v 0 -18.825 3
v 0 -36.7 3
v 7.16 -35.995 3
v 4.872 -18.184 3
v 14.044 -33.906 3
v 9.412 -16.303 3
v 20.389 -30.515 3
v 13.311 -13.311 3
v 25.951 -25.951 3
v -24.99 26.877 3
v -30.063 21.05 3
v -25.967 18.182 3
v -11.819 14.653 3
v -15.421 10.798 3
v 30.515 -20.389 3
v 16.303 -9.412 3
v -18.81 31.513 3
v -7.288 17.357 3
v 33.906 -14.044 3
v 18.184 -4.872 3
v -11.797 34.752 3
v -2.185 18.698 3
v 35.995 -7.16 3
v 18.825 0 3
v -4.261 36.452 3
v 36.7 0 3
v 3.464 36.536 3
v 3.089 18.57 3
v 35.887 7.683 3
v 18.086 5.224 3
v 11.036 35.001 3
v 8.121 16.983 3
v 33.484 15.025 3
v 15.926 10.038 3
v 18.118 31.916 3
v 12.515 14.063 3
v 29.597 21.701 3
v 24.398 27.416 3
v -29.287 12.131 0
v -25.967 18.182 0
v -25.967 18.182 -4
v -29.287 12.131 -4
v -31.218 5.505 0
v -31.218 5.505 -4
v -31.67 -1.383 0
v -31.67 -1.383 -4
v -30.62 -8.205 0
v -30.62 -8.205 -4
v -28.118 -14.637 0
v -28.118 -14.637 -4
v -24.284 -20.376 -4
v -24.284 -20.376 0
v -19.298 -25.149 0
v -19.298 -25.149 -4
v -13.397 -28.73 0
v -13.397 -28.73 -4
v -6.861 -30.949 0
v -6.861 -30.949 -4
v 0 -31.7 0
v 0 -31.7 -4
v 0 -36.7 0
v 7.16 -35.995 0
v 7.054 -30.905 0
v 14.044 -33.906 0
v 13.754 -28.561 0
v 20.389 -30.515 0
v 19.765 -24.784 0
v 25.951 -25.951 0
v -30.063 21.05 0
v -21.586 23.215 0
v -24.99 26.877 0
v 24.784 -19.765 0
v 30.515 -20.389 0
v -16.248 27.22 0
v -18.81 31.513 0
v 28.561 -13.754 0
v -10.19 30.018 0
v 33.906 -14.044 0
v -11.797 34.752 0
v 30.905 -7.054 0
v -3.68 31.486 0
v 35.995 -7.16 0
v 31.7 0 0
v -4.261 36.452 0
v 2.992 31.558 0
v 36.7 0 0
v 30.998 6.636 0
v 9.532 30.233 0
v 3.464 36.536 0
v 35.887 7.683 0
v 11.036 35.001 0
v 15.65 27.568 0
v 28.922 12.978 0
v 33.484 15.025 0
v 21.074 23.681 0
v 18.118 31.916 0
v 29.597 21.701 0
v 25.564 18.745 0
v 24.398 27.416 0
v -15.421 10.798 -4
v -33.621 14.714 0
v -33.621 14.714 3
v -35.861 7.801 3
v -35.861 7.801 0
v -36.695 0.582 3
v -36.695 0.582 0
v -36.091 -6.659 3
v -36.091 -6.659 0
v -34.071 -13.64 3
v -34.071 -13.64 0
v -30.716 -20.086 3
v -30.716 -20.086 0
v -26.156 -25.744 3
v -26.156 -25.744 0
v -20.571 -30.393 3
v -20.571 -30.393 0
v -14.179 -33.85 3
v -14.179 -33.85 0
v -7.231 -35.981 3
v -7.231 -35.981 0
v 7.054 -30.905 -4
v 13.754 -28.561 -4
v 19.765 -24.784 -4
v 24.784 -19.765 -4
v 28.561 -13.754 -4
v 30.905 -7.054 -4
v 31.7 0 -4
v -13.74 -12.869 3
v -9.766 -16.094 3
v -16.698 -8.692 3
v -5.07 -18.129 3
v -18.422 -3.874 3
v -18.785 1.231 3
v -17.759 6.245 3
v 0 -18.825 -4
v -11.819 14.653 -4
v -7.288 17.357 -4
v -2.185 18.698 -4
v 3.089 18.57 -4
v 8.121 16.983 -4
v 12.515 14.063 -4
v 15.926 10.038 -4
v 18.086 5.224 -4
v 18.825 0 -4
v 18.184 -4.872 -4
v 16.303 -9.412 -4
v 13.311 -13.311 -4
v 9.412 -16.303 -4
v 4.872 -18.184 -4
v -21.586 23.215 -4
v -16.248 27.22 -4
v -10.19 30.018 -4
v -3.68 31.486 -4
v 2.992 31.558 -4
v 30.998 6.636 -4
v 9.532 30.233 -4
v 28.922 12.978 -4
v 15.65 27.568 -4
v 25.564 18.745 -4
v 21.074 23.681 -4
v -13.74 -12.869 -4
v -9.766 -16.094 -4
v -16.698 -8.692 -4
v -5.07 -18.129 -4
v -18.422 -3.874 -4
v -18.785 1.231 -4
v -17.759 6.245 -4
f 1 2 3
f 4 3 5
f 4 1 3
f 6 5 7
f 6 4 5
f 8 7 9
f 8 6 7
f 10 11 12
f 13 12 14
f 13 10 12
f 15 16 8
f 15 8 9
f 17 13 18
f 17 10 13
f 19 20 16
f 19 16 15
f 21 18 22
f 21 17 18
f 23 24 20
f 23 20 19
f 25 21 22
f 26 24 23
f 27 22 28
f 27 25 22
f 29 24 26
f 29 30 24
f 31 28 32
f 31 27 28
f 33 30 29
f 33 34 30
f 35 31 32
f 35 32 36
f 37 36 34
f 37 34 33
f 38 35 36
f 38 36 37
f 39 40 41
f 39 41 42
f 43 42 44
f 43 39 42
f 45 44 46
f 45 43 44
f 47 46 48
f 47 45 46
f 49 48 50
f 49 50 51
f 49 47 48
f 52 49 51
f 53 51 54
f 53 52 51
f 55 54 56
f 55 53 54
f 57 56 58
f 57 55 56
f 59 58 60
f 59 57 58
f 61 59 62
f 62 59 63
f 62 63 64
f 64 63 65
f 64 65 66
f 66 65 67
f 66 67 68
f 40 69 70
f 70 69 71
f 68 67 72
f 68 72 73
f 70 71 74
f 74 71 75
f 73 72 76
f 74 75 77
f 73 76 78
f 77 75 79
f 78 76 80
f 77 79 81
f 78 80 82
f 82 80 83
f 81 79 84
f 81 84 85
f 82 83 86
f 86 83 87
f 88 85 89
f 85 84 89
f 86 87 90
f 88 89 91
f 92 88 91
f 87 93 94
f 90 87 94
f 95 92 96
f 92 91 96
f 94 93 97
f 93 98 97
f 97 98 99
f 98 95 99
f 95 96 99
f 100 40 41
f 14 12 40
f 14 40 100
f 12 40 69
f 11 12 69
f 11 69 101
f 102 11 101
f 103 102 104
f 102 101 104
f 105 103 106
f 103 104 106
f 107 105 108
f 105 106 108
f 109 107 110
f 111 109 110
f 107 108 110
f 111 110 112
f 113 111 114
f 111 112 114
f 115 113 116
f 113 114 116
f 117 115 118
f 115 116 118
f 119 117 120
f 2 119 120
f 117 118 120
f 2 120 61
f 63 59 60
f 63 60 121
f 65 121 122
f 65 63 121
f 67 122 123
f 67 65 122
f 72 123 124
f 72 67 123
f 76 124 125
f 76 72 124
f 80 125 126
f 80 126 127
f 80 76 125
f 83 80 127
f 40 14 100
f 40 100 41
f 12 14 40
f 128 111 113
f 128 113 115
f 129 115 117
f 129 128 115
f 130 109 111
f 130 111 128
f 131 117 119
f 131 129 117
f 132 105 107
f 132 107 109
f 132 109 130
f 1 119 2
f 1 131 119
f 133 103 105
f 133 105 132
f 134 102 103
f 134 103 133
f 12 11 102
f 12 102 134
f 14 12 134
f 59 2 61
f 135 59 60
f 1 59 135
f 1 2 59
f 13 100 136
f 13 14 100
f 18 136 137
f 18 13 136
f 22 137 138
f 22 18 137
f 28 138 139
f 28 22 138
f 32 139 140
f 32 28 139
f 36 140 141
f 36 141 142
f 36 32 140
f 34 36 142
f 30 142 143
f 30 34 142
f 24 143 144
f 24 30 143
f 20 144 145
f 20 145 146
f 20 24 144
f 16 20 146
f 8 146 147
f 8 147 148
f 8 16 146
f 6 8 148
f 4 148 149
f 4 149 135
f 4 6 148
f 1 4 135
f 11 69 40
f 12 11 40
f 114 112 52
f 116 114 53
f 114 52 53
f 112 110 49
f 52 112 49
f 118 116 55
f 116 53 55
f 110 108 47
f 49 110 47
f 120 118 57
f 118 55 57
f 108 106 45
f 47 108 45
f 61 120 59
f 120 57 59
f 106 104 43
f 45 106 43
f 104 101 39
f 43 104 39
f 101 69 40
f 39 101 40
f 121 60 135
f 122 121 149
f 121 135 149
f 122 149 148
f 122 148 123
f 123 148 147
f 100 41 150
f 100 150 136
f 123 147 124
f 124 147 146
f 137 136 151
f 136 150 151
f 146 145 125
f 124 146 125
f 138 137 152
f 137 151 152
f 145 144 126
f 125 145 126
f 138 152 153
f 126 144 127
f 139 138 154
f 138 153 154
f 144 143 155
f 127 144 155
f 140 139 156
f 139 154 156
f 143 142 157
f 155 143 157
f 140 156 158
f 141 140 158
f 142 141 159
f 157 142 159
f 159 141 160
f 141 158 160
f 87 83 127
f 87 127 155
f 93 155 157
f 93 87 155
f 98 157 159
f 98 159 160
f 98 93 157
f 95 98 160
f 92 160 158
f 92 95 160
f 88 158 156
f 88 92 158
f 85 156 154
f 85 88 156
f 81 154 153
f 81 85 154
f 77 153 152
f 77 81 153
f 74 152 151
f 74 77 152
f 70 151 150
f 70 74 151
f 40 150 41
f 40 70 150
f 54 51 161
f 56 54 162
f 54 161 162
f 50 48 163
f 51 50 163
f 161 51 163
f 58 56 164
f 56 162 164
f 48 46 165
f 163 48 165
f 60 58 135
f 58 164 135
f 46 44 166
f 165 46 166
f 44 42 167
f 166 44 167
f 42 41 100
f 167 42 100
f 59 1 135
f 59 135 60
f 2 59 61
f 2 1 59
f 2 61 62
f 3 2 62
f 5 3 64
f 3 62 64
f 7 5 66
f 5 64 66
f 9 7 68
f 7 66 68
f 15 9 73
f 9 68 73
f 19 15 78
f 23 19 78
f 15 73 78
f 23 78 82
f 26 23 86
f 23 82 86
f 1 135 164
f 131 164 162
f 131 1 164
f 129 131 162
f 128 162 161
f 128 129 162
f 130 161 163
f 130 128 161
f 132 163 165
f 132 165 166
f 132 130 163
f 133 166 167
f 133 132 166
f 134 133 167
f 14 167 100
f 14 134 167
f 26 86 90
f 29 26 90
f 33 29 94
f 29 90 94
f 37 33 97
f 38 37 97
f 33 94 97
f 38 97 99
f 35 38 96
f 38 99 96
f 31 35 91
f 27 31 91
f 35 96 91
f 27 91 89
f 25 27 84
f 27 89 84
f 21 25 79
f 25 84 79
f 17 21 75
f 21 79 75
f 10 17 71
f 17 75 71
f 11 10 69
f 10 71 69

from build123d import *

# Parameters (mm, degrees)
F1_DEPTH = 3
F2_DEPTH = 4
F3_DEPTH = 3
F4_DEPTH = 4


with BuildPart() as f1:
    # F0 (on Top) → F1 (new body)
    with BuildSketch(Plane.XY):
        with BuildLine():
            Line((-30.0628800254, 21.0502552141), (-25.967119804, 18.1823730323))
            ThreePointArc((-25.967119804, 18.1823730323), (9.5323738443, 30.2328273387), (31.7, 0))
            ThreePointArc((31.7, 0), (22.4152849636, -22.4152849636), (0, -31.7))
            Line((0, -31.7), (0, -36.7))
            ThreePointArc((0, -36.7), (25.9508188695, -25.9508188695), (36.7, 0))
            ThreePointArc((36.7, 0), (11.0359028418, 35.0014120925), (-30.0628800254, 21.0502552141))
        make_face()
        with BuildLine():
            ThreePointArc((-15.4205372337, 10.7975764143), (5.6607866757, 17.9537215978), (18.825, 0))
            ThreePointArc((18.825, 0), (13.3112851558, -13.3112851558), (0, -18.825))
            Line((0, -18.825), (0, -31.7))
            ThreePointArc((0, -31.7), (22.4152849636, -22.4152849636), (31.7, 0))
            ThreePointArc((31.7, 0), (9.5323738443, 30.2328273387), (-25.967119804, 18.1823730323))
            Line((-25.967119804, 18.1823730323), (-15.4205372337, 10.7975764143))
        make_face()
    extrude(amount=F1_DEPTH)

    # F0 (on Top) → F2 (join)
    with BuildSketch(Plane.XY):
        with BuildLine():
            ThreePointArc((-15.4205372337, 10.7975764143), (5.6607866757, 17.9537215978), (18.825, 0))
            ThreePointArc((18.825, 0), (13.3112851558, -13.3112851558), (0, -18.825))
            Line((0, -18.825), (0, -31.7))
            ThreePointArc((0, -31.7), (22.4152849636, -22.4152849636), (31.7, 0))
            ThreePointArc((31.7, 0), (9.5323738443, 30.2328273387), (-25.967119804, 18.1823730323))
            Line((-25.967119804, 18.1823730323), (-15.4205372337, 10.7975764143))
        make_face()
    extrude(amount=-F2_DEPTH)


with BuildPart() as f3:
    # F0 (on Top) → F3 (new body)
    with BuildSketch(Plane.XY):
        with BuildLine():
            ThreePointArc((0, -18.825), (-16.6979789346, -8.6924176441), (-15.4205372337, 10.7975764143))
            Line((-15.4205372337, 10.7975764143), (-25.967119804, 18.1823730323))
            ThreePointArc((-25.967119804, 18.1823730323), (-28.1182434117, -14.6374310396), (0, -31.7))
            Line((0, -31.7), (0, -18.825))
        make_face()
        with BuildLine():
            ThreePointArc((0, -31.7), (-28.1182434117, -14.6374310396), (-25.967119804, 18.1823730323))
            Line((-25.967119804, 18.1823730323), (-30.0628800254, 21.0502552141))
            ThreePointArc((-30.0628800254, 21.0502552141), (-32.5532975776, -16.9461741057), (0, -36.7))
            Line((0, -36.7), (0, -31.7))
        make_face()
    extrude(amount=F3_DEPTH)

    # F0 (on Top) → F4 (join)
    with BuildSketch(Plane.XY):
        with BuildLine():
            ThreePointArc((0, -18.825), (-16.6979789346, -8.6924176441), (-15.4205372337, 10.7975764143))
            Line((-15.4205372337, 10.7975764143), (-25.967119804, 18.1823730323))
            ThreePointArc((-25.967119804, 18.1823730323), (-28.1182434117, -14.6374310396), (0, -31.7))
            Line((0, -31.7), (0, -18.825))
        make_face()
    extrude(amount=-F4_DEPTH)


solid = Compound([f1.part, f3.part])
